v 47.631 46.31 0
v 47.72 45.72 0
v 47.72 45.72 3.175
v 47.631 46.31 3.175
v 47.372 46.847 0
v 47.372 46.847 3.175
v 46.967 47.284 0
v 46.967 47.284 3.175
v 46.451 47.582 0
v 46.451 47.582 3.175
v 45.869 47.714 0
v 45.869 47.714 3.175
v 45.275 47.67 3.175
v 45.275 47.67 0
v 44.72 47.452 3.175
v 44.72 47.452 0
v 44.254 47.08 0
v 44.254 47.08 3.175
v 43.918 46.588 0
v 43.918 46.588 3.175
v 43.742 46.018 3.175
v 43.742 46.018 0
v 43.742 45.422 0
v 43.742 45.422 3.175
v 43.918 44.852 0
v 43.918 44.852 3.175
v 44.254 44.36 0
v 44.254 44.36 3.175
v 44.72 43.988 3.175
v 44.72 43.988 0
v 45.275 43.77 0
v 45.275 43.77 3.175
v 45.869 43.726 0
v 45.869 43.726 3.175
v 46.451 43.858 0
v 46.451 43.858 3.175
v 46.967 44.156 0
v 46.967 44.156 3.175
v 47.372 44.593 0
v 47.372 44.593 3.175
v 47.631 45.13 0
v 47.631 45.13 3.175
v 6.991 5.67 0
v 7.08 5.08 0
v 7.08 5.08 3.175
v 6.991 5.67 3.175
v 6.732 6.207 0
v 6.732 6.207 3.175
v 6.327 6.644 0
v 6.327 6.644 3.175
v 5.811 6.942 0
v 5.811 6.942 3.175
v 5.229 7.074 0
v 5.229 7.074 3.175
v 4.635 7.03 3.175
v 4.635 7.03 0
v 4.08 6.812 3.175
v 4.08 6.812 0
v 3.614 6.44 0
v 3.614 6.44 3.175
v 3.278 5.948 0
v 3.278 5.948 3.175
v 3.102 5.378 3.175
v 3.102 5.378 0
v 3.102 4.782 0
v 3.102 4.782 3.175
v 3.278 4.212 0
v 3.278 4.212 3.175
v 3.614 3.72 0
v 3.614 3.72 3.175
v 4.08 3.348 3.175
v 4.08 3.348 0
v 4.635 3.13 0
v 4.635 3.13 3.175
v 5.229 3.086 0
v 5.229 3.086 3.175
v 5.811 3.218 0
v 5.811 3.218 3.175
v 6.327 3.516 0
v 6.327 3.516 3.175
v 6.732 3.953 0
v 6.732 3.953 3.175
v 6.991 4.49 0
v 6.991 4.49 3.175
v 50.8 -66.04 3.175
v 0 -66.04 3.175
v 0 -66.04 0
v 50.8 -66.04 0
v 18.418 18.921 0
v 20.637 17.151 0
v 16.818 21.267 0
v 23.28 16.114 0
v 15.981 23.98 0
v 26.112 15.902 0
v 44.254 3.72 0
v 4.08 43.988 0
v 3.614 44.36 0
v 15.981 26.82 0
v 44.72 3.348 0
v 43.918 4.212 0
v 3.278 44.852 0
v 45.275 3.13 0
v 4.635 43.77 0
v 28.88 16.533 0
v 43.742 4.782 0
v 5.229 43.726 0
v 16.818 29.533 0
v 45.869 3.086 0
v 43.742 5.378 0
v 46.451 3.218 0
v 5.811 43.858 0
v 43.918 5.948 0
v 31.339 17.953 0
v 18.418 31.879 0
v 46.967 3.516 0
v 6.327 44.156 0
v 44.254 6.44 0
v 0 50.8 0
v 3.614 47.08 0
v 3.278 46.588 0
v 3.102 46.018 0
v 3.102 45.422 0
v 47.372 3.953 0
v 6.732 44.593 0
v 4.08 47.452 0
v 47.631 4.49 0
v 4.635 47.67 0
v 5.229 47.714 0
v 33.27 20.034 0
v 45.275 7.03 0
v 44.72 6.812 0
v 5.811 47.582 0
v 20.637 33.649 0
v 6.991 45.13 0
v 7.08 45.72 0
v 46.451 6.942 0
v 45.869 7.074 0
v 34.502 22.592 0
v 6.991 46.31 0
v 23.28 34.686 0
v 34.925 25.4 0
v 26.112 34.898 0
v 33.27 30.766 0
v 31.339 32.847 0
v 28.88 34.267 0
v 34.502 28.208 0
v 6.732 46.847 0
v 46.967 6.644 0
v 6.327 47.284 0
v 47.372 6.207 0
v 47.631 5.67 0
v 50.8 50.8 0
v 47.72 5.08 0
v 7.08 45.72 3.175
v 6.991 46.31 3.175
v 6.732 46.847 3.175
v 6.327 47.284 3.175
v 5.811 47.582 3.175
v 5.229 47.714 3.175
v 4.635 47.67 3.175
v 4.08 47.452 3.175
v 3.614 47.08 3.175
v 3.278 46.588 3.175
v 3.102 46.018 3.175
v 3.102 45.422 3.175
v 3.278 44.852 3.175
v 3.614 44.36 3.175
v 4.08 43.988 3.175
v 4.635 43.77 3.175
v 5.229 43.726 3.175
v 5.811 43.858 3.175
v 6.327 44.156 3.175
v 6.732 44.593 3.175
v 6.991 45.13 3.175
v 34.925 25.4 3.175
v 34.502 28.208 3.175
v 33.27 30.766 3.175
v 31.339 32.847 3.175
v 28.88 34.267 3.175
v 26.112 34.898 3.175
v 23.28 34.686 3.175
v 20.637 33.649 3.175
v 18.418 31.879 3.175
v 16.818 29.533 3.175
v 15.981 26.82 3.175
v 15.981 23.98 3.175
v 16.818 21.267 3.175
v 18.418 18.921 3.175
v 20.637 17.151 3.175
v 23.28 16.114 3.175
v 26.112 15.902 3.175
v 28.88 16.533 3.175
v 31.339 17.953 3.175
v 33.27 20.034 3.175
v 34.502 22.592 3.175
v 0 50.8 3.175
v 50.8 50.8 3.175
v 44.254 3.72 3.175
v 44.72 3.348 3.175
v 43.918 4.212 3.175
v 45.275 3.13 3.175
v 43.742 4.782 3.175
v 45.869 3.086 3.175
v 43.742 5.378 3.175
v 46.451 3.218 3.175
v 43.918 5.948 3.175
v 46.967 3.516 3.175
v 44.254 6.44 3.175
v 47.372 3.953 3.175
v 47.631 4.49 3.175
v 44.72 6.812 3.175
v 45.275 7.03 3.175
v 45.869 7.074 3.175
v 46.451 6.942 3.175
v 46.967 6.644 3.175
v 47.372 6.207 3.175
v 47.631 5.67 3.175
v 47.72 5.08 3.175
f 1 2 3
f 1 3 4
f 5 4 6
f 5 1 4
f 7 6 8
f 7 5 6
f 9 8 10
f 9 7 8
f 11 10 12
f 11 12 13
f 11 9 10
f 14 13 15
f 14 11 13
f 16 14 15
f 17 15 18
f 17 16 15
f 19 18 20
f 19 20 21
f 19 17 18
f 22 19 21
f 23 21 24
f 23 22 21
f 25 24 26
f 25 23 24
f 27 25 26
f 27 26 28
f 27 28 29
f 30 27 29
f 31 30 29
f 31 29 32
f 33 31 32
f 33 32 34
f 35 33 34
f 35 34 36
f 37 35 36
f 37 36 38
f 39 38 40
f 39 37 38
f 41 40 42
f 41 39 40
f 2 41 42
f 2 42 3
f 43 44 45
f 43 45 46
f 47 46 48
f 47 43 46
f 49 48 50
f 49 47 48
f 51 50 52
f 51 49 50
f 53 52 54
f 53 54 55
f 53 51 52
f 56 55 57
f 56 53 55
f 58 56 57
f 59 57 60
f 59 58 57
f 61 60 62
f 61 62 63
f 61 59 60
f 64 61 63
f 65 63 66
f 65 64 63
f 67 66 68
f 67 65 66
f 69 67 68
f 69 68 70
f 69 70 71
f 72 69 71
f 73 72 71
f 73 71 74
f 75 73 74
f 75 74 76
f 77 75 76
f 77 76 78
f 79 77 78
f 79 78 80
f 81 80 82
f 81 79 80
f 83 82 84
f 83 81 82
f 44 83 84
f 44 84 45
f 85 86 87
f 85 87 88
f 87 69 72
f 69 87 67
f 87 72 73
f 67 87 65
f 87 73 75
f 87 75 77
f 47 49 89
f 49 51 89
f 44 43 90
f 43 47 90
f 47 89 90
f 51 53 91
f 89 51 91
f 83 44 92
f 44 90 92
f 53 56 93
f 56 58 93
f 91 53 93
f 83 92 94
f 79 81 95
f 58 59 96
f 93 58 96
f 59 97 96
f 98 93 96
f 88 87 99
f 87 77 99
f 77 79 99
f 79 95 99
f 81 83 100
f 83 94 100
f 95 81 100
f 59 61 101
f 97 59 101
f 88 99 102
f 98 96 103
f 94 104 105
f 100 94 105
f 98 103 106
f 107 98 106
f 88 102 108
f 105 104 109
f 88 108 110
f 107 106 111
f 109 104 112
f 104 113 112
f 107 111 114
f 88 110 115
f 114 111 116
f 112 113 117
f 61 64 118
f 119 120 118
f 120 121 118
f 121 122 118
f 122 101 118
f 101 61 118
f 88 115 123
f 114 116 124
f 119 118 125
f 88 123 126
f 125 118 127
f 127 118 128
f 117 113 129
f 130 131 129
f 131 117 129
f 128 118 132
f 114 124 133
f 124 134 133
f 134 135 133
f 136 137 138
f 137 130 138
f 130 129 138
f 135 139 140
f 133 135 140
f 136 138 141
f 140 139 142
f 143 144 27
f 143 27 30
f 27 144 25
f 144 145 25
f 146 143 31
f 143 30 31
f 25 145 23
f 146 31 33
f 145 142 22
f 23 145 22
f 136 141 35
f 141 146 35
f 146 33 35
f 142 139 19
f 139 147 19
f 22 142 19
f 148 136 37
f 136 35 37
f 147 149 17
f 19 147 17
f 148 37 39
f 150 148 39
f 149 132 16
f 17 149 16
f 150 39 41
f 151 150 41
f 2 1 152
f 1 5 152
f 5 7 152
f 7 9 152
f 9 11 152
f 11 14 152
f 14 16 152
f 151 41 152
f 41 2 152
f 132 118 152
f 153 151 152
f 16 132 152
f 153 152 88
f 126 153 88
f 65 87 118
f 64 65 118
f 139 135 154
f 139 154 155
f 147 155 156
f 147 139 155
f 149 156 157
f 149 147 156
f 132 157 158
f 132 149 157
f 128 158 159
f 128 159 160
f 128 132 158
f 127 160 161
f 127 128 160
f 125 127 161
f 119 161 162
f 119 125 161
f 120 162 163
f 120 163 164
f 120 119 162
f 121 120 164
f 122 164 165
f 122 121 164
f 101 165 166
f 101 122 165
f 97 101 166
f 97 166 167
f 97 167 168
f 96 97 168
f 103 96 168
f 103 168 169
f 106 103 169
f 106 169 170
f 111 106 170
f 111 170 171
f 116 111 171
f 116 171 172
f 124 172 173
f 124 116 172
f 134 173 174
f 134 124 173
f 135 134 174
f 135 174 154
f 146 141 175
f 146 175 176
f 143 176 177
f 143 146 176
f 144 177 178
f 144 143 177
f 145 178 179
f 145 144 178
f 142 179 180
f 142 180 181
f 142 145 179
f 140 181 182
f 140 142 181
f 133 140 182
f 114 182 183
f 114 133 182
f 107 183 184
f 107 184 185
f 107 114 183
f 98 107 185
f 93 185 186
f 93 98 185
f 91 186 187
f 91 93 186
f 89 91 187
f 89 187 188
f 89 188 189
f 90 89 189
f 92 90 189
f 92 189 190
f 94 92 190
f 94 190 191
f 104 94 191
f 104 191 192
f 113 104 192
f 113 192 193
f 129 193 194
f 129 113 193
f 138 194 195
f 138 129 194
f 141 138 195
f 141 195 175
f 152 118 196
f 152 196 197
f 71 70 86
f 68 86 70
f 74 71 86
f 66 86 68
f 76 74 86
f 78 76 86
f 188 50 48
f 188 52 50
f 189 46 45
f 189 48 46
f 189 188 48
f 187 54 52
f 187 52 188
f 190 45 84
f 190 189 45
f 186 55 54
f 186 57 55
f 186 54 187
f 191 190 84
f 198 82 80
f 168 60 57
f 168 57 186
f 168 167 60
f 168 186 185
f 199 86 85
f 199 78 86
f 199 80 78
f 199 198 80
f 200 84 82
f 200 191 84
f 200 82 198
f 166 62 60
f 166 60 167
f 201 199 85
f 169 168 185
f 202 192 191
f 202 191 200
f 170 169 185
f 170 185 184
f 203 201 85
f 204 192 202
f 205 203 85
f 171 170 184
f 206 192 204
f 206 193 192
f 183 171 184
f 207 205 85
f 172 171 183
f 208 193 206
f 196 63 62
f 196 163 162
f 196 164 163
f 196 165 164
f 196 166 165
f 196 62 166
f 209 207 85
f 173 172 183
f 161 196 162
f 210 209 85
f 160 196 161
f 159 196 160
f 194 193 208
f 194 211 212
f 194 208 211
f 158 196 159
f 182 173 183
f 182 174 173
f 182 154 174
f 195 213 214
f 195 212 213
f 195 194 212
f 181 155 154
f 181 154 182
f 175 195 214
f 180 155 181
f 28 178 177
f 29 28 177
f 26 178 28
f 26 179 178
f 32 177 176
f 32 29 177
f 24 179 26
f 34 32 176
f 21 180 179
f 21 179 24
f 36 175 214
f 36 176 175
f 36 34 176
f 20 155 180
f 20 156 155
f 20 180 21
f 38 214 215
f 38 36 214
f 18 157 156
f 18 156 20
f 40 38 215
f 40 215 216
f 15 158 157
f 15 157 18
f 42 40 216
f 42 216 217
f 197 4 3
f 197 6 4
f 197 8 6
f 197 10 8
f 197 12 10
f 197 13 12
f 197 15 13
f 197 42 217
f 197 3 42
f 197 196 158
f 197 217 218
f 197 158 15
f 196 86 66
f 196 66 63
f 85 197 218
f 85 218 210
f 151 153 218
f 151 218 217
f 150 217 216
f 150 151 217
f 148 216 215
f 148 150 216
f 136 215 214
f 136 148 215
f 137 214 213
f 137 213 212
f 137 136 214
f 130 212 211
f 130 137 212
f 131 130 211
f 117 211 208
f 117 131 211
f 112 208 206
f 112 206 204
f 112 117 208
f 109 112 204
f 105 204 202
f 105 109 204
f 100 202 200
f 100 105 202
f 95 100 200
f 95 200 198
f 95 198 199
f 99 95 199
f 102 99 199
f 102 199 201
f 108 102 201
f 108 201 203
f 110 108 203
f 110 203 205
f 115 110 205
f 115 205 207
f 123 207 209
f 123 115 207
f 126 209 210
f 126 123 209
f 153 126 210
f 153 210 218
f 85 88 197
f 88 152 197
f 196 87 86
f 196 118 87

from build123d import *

# Parameters (mm, degrees)
SKETCH2_W           = 50.8
SKETCH2_H           = 50.8
SKETCH2_R           = 2
SKETCH2_R_2         = 9.525
BOSS_EXTRUDE1_DEPTH = 3.175
SKETCH3_W           = 50.8
SKETCH3_H           = 3.175
BOSS_EXTRUDE2_DEPTH = 66.04


with BuildPart() as part:
    # Sketch2 → Boss-Extrude1 (new body)
    with BuildSketch(Plane.XY):
        with Locations((25.4, 25.4)):
            Rectangle(SKETCH2_W, SKETCH2_H)
        with Locations((5.08, 45.72)):
            Circle(SKETCH2_R, mode=Mode.SUBTRACT)
        with Locations((45.72, 45.72)):
            Circle(SKETCH2_R, mode=Mode.SUBTRACT)
        with Locations((45.72, 5.08)):
            Circle(SKETCH2_R, mode=Mode.SUBTRACT)
        with Locations((5.08, 5.08)):
            Circle(SKETCH2_R, mode=Mode.SUBTRACT)
        with Locations((25.4, 25.4)):
            Circle(SKETCH2_R_2, mode=Mode.SUBTRACT)
    extrude(amount=BOSS_EXTRUDE1_DEPTH)

    # Sketch3 → Boss-Extrude2 (add)
    with BuildSketch(Plane.XZ):
        with Locations((25.4, 1.5875)):
            Rectangle(SKETCH3_W, SKETCH3_H)
    extrude(amount=BOSS_EXTRUDE2_DEPTH)


solid = part.part
